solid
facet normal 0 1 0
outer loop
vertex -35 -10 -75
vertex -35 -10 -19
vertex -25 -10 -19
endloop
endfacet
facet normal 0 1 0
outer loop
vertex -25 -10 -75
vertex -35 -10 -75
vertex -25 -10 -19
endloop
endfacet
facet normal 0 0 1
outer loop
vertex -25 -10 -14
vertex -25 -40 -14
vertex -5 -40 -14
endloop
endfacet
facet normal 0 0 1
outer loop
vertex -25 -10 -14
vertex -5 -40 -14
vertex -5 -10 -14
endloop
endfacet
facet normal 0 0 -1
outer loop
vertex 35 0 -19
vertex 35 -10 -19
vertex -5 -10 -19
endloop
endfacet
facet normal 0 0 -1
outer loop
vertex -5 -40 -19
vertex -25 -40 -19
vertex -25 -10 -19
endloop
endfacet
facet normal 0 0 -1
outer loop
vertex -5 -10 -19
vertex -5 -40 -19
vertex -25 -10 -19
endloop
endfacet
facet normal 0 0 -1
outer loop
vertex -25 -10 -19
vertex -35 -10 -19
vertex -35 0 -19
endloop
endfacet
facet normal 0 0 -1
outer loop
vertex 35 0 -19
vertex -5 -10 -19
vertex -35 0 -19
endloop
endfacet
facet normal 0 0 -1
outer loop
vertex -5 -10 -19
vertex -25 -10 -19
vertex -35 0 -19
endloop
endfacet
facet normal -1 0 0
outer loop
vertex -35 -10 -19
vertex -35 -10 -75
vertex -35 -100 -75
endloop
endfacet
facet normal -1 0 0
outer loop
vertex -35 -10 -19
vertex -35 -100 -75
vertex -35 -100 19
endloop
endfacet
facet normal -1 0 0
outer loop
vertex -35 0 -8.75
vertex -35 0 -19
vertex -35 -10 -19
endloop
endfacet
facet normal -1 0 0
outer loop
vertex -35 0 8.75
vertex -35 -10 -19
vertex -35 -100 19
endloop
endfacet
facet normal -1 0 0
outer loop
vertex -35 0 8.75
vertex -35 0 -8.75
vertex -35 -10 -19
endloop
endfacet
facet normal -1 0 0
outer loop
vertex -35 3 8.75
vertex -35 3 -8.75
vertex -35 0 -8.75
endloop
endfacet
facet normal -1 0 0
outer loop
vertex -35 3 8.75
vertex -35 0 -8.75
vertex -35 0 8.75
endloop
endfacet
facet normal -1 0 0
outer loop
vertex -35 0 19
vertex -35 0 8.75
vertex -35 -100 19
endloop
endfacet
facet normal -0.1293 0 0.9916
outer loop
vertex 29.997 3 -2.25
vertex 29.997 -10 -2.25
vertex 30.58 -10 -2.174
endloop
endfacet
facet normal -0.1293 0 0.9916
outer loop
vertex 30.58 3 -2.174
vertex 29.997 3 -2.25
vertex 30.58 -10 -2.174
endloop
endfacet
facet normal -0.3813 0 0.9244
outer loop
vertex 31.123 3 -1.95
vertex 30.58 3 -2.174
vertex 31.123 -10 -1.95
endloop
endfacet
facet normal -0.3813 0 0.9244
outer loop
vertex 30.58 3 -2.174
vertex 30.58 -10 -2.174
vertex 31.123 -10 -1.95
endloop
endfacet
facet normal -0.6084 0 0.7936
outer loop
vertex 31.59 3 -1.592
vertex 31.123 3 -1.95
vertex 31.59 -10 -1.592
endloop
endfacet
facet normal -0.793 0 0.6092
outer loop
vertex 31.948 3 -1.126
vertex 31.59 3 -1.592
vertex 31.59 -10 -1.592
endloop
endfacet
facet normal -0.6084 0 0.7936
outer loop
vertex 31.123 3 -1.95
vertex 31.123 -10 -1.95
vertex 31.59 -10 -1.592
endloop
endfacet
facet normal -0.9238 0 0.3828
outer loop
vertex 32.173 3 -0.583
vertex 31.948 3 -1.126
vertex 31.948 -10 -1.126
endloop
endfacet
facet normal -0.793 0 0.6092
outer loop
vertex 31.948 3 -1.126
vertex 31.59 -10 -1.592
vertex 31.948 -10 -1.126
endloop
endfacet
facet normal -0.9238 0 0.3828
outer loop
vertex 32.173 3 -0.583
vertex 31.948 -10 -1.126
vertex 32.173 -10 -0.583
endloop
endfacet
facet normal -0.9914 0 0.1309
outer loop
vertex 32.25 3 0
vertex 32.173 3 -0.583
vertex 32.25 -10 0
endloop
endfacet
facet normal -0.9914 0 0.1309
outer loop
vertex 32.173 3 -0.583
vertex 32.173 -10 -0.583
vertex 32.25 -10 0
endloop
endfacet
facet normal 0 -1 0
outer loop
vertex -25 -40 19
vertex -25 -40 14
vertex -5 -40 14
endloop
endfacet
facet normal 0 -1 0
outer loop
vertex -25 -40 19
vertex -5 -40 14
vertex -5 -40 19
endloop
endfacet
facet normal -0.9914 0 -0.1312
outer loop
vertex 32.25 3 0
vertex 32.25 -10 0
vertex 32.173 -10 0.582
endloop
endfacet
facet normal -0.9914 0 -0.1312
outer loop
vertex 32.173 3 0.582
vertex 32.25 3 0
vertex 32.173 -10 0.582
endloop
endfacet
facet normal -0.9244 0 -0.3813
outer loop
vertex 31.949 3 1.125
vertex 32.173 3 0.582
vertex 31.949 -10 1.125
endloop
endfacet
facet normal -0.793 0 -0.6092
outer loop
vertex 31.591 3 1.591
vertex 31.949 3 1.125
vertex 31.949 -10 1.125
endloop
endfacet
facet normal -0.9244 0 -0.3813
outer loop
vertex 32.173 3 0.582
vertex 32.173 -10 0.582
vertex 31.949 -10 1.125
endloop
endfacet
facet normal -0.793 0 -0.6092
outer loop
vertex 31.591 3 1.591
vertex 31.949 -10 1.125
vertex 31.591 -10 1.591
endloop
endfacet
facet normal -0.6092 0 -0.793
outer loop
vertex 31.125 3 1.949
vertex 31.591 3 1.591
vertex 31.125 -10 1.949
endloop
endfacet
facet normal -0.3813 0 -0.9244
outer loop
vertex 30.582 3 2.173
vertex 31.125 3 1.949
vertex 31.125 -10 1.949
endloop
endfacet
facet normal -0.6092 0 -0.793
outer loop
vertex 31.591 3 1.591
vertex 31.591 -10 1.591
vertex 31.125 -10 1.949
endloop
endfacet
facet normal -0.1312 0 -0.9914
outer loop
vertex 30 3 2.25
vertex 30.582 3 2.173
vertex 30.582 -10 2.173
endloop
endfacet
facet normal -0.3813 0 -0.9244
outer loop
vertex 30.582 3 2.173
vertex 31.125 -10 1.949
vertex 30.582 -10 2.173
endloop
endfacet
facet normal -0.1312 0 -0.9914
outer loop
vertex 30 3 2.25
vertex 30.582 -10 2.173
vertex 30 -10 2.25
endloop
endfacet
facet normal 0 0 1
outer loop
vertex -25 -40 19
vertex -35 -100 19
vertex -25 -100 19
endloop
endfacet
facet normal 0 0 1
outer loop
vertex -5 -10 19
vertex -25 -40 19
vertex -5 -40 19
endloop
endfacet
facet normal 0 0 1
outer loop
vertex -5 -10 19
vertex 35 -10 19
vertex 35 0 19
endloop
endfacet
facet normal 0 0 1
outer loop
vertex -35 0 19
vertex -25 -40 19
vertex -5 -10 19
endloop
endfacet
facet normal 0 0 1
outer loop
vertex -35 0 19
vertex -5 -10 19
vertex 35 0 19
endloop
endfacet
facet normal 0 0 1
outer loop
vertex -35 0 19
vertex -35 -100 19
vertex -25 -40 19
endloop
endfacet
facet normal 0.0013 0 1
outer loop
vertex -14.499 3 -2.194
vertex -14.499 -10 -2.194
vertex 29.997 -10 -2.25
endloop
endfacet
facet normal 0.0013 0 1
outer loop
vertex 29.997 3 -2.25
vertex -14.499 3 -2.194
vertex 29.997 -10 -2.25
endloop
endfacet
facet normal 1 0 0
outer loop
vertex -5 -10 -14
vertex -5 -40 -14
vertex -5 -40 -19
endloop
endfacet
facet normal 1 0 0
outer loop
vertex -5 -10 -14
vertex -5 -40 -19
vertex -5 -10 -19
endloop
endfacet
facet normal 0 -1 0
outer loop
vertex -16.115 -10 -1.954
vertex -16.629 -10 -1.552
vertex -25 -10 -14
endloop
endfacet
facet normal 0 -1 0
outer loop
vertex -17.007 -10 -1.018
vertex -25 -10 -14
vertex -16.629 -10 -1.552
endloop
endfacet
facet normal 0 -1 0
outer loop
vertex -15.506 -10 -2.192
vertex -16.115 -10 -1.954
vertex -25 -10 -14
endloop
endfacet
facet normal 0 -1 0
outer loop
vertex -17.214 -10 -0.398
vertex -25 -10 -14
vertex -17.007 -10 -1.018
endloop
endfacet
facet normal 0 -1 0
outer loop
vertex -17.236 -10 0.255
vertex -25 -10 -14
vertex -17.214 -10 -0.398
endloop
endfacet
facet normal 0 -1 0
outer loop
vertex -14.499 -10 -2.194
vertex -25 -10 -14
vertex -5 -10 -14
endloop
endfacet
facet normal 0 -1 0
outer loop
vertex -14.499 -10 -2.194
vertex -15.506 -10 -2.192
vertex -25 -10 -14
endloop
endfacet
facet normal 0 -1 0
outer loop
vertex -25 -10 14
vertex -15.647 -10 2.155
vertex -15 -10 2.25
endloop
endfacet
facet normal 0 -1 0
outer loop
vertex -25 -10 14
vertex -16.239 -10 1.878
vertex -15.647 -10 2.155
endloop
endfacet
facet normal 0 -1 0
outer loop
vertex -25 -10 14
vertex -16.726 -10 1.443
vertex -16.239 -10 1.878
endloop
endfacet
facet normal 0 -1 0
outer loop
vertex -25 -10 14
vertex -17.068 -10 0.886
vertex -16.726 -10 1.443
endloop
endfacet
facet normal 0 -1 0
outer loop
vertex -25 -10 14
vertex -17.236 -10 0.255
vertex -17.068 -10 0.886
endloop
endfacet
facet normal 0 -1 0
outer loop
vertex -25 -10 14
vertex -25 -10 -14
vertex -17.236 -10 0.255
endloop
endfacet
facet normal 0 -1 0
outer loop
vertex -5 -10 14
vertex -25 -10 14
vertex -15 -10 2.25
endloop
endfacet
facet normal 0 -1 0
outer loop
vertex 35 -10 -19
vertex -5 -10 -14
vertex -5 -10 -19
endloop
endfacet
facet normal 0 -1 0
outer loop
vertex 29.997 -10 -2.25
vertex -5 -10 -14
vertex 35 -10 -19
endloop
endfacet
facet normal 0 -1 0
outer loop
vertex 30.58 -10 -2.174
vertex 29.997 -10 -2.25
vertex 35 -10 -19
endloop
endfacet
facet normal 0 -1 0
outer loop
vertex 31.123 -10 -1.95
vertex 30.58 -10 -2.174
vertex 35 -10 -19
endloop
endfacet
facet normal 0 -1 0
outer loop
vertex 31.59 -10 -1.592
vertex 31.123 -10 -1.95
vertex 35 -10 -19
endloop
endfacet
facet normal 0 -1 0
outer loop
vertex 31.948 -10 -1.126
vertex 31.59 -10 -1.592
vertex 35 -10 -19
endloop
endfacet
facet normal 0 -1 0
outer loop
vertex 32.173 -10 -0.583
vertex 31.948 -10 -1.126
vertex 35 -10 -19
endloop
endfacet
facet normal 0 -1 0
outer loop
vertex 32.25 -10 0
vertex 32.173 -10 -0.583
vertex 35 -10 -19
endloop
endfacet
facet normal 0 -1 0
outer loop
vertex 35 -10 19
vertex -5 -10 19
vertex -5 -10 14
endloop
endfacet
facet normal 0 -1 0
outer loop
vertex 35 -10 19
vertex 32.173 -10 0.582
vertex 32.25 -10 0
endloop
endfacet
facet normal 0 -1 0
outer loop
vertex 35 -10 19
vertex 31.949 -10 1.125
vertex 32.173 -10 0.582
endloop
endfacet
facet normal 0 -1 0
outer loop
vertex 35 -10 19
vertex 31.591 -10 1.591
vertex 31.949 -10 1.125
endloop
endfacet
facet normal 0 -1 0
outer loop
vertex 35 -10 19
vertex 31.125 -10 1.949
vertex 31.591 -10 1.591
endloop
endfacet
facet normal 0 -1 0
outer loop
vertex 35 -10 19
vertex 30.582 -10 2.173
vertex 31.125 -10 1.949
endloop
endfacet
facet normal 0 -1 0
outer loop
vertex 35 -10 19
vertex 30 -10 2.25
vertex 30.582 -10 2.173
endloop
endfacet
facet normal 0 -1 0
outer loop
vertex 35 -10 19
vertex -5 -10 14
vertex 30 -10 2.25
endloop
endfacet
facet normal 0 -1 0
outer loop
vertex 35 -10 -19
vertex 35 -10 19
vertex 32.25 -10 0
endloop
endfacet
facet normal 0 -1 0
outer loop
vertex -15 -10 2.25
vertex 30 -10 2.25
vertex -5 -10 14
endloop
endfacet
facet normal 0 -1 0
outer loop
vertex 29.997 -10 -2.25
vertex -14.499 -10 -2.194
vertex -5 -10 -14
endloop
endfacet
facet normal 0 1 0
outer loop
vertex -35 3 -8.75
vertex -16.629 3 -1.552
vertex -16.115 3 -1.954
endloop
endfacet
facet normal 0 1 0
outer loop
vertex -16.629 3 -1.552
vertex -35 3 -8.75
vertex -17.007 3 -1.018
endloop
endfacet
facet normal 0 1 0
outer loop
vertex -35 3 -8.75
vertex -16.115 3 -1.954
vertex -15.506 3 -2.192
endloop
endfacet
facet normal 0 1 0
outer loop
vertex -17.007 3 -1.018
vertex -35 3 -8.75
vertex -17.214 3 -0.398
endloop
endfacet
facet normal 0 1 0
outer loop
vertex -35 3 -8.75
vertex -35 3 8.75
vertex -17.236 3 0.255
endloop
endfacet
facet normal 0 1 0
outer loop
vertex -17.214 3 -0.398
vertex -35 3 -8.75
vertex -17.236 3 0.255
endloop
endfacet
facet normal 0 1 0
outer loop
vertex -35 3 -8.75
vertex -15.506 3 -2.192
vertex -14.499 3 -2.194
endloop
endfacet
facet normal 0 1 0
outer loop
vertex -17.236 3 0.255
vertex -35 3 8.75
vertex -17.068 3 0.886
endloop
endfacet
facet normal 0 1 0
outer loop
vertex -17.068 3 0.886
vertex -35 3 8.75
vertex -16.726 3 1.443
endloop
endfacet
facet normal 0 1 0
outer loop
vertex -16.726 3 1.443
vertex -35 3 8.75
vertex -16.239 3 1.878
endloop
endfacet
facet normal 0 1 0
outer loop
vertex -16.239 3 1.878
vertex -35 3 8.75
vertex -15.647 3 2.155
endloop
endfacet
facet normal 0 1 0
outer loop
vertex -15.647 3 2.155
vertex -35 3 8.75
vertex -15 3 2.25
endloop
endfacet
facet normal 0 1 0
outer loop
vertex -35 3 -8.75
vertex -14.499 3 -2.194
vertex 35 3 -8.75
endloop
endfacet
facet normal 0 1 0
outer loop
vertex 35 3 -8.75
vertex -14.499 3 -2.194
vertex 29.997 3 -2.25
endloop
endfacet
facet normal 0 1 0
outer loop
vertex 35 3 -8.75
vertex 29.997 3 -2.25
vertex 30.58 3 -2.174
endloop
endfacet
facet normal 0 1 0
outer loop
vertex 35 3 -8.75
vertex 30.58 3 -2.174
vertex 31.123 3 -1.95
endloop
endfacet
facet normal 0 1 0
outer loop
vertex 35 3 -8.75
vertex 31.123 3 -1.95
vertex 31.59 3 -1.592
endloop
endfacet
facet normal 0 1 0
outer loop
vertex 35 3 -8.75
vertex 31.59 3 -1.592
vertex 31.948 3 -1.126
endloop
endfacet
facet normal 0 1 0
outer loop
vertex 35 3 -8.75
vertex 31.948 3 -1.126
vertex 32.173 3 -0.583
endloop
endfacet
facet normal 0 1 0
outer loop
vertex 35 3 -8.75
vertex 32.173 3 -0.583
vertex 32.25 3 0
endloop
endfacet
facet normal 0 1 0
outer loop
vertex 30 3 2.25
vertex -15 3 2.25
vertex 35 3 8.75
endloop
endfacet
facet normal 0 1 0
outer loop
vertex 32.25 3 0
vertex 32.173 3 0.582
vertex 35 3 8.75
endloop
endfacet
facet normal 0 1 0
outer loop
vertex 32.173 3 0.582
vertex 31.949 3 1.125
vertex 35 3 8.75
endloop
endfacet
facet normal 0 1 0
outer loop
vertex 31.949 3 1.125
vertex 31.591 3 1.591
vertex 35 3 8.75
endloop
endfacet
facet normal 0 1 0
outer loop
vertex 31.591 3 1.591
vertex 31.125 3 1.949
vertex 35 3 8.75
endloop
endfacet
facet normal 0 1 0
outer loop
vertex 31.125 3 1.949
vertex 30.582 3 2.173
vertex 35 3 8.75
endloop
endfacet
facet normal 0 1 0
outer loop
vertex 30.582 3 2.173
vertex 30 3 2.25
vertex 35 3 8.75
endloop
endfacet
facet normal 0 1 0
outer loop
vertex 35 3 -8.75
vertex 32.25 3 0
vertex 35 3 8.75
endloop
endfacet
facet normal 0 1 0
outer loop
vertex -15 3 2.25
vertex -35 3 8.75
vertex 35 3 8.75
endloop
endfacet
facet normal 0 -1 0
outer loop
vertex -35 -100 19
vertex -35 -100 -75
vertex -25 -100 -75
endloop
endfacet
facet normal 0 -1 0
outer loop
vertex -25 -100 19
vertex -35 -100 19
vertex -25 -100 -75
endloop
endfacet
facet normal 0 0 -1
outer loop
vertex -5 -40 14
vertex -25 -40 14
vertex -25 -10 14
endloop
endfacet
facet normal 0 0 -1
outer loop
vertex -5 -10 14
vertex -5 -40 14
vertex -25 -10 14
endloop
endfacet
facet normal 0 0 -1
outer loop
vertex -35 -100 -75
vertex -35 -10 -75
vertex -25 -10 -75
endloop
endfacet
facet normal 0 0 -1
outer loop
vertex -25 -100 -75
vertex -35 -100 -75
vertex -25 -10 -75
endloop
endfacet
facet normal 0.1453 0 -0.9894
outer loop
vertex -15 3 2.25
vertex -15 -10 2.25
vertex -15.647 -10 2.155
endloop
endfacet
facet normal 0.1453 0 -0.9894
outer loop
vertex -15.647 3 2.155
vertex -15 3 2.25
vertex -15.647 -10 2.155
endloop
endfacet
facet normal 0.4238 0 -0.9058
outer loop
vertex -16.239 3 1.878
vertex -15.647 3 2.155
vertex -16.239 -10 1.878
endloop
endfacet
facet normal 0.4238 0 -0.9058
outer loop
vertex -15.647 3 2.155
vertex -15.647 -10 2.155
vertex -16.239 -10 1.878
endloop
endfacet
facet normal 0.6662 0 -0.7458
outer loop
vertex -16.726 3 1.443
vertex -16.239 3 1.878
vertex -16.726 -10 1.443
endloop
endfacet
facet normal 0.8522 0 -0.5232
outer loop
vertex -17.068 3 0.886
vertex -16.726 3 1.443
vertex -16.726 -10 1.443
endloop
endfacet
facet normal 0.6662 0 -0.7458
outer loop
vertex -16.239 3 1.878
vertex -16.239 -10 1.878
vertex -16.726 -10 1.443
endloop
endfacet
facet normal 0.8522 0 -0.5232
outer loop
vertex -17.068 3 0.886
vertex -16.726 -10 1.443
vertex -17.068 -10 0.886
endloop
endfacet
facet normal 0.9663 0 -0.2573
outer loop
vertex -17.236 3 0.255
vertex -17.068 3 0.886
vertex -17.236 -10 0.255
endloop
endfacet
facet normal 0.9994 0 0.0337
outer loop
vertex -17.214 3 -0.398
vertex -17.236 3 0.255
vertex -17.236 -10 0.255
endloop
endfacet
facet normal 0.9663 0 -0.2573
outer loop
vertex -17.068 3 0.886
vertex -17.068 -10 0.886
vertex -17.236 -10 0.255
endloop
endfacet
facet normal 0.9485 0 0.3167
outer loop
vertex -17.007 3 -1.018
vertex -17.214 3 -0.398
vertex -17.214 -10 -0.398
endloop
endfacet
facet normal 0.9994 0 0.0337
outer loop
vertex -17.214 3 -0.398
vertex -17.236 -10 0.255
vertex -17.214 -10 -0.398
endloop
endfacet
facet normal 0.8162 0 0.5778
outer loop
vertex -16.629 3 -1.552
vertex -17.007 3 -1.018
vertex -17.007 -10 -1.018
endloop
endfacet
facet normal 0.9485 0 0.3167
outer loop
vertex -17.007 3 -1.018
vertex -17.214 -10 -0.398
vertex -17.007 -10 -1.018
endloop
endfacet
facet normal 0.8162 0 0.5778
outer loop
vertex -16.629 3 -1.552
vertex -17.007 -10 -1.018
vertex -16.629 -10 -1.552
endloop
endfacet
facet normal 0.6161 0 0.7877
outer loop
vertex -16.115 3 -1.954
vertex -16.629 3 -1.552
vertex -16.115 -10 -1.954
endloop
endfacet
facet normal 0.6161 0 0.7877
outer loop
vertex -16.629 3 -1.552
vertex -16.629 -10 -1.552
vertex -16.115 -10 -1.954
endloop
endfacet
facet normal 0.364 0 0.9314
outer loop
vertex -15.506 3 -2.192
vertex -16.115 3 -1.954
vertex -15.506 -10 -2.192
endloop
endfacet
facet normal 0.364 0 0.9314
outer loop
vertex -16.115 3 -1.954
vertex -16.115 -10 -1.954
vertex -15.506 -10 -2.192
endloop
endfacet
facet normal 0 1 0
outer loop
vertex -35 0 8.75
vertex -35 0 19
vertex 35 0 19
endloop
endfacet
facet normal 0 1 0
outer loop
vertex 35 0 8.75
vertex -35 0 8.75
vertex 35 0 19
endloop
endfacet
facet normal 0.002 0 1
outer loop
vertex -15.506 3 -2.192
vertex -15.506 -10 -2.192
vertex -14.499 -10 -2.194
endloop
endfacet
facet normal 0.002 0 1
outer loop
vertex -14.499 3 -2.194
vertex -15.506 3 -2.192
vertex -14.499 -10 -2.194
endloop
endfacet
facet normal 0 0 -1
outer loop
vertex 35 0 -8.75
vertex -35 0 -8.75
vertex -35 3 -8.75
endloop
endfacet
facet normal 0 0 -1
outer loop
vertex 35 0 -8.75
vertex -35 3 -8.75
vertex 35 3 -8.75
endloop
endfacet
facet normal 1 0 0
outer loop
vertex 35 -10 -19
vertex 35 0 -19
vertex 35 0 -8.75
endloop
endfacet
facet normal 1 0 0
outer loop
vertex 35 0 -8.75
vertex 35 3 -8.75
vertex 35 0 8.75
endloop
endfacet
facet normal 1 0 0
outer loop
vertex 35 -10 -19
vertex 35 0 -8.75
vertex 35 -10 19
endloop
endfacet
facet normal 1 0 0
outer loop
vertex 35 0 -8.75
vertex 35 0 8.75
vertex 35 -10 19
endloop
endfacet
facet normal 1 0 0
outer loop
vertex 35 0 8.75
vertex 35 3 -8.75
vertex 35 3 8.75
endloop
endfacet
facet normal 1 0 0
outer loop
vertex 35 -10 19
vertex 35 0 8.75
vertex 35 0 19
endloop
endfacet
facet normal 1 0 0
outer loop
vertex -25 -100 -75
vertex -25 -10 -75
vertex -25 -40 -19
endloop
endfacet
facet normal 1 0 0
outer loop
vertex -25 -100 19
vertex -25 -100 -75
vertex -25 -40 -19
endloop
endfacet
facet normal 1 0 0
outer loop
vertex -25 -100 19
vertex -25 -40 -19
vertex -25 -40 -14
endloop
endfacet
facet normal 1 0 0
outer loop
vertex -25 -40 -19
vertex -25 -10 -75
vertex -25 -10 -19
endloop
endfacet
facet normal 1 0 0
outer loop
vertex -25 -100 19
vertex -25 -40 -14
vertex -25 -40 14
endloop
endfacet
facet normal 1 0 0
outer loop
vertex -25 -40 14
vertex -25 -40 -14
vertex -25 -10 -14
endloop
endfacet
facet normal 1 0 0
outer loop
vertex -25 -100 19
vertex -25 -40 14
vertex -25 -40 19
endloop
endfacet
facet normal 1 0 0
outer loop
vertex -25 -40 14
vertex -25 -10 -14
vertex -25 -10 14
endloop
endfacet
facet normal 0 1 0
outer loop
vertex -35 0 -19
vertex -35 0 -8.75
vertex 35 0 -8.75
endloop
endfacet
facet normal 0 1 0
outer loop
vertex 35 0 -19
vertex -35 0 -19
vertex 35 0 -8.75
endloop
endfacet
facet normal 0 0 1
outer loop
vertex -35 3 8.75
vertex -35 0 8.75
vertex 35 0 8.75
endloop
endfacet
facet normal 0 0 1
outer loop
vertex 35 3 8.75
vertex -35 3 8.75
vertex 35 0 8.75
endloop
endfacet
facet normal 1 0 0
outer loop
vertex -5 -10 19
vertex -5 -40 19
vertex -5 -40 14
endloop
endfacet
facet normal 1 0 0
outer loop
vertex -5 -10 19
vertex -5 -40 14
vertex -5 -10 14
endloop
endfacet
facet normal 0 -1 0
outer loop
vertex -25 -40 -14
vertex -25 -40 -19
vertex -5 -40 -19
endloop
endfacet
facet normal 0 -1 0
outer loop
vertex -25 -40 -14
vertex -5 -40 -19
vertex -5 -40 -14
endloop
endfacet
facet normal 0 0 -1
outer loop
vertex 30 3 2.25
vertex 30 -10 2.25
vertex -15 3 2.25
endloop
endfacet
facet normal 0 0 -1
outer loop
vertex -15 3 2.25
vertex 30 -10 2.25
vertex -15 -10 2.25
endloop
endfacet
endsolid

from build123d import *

# Parameters (mm, degrees)
F0_W     = 70
F0_H     = 10.25
F0_H_2   = 17.5
F1_DEPTH = 10
F2_DEPTH = 3
F4_DEPTH = 25
F5_W     = 10
F5_H     = 94
F6_DEPTH = 90
F7_W     = 30
F7_H     = 5
F8_DEPTH = 20


with BuildPart() as f1:
    # F0 (on Front) → F1 (new body)
    with BuildSketch(Plane.XZ):
        with Locations((0, 13.875)):
            Rectangle(F0_W, F0_H)
        Rectangle(F0_W, F0_H_2)
        with Locations((0, -13.875)):
            Rectangle(F0_W, F0_H)
    extrude(amount=F1_DEPTH)

    # F0 (on Front) → F2 (join)
    with BuildSketch(Plane.XZ):
        Rectangle(F0_W, F0_H_2)
    extrude(amount=-F2_DEPTH)

    # F3 (on face) → F4 (cut)
    with BuildSketch(Plane.XZ.offset(10)):
        with BuildLine():
            ThreePointArc((-12.75, 0), (-13.40901, 1.59099), (-15, 2.25))
            ThreePointArc((-15, 2.25), (-17.235535, 0.254723), (-15.506171, -2.192325))
            Line((-15.506171, -2.192325), (-14.499388, -2.193601))
            ThreePointArc((-14.499388, -2.193601), (-13.240898, -1.402876), (-12.75, 0))
        make_face()
        with BuildLine():
            ThreePointArc((29.997148, -2.249998), (27.75, 0.001426), (30, 2.25))
            Line((30, 2.25), (-15, 2.25))
            ThreePointArc((-15, 2.25), (-13.40901, 1.59099), (-12.75, 0))
            ThreePointArc((-12.75, 0), (-13.240898, -1.402876), (-14.499388, -2.193601))
            Line((-14.499388, -2.193601), (29.997148, -2.249998))
        make_face()
        with BuildLine():
            ThreePointArc((29.997148, -2.249998), (31.589982, -1.591998), (32.25, 0))
            ThreePointArc((32.25, 0), (31.59099, 1.59099), (30, 2.25))
            ThreePointArc((30, 2.25), (27.75, 0.001426), (29.997148, -2.249998))
        make_face()
    extrude(amount=-F4_DEPTH, mode=Mode.SUBTRACT)

    # F5 (on face) → F6 (join)
    with BuildSketch(Plane.XZ.offset(10)):
        with Locations((-30, -28)):
            Rectangle(F5_W, F5_H)
    extrude(amount=F6_DEPTH)

    # F7 (on face) → F8 (join)
    with BuildSketch(Plane.YZ.offset(-25)):
        with Locations((-25, 16.5)):
            Rectangle(F7_W, F7_H)
        with Locations((-25, -16.5)):
            Rectangle(F7_W, F7_H)
    extrude(amount=F8_DEPTH)


solid = f1.part
